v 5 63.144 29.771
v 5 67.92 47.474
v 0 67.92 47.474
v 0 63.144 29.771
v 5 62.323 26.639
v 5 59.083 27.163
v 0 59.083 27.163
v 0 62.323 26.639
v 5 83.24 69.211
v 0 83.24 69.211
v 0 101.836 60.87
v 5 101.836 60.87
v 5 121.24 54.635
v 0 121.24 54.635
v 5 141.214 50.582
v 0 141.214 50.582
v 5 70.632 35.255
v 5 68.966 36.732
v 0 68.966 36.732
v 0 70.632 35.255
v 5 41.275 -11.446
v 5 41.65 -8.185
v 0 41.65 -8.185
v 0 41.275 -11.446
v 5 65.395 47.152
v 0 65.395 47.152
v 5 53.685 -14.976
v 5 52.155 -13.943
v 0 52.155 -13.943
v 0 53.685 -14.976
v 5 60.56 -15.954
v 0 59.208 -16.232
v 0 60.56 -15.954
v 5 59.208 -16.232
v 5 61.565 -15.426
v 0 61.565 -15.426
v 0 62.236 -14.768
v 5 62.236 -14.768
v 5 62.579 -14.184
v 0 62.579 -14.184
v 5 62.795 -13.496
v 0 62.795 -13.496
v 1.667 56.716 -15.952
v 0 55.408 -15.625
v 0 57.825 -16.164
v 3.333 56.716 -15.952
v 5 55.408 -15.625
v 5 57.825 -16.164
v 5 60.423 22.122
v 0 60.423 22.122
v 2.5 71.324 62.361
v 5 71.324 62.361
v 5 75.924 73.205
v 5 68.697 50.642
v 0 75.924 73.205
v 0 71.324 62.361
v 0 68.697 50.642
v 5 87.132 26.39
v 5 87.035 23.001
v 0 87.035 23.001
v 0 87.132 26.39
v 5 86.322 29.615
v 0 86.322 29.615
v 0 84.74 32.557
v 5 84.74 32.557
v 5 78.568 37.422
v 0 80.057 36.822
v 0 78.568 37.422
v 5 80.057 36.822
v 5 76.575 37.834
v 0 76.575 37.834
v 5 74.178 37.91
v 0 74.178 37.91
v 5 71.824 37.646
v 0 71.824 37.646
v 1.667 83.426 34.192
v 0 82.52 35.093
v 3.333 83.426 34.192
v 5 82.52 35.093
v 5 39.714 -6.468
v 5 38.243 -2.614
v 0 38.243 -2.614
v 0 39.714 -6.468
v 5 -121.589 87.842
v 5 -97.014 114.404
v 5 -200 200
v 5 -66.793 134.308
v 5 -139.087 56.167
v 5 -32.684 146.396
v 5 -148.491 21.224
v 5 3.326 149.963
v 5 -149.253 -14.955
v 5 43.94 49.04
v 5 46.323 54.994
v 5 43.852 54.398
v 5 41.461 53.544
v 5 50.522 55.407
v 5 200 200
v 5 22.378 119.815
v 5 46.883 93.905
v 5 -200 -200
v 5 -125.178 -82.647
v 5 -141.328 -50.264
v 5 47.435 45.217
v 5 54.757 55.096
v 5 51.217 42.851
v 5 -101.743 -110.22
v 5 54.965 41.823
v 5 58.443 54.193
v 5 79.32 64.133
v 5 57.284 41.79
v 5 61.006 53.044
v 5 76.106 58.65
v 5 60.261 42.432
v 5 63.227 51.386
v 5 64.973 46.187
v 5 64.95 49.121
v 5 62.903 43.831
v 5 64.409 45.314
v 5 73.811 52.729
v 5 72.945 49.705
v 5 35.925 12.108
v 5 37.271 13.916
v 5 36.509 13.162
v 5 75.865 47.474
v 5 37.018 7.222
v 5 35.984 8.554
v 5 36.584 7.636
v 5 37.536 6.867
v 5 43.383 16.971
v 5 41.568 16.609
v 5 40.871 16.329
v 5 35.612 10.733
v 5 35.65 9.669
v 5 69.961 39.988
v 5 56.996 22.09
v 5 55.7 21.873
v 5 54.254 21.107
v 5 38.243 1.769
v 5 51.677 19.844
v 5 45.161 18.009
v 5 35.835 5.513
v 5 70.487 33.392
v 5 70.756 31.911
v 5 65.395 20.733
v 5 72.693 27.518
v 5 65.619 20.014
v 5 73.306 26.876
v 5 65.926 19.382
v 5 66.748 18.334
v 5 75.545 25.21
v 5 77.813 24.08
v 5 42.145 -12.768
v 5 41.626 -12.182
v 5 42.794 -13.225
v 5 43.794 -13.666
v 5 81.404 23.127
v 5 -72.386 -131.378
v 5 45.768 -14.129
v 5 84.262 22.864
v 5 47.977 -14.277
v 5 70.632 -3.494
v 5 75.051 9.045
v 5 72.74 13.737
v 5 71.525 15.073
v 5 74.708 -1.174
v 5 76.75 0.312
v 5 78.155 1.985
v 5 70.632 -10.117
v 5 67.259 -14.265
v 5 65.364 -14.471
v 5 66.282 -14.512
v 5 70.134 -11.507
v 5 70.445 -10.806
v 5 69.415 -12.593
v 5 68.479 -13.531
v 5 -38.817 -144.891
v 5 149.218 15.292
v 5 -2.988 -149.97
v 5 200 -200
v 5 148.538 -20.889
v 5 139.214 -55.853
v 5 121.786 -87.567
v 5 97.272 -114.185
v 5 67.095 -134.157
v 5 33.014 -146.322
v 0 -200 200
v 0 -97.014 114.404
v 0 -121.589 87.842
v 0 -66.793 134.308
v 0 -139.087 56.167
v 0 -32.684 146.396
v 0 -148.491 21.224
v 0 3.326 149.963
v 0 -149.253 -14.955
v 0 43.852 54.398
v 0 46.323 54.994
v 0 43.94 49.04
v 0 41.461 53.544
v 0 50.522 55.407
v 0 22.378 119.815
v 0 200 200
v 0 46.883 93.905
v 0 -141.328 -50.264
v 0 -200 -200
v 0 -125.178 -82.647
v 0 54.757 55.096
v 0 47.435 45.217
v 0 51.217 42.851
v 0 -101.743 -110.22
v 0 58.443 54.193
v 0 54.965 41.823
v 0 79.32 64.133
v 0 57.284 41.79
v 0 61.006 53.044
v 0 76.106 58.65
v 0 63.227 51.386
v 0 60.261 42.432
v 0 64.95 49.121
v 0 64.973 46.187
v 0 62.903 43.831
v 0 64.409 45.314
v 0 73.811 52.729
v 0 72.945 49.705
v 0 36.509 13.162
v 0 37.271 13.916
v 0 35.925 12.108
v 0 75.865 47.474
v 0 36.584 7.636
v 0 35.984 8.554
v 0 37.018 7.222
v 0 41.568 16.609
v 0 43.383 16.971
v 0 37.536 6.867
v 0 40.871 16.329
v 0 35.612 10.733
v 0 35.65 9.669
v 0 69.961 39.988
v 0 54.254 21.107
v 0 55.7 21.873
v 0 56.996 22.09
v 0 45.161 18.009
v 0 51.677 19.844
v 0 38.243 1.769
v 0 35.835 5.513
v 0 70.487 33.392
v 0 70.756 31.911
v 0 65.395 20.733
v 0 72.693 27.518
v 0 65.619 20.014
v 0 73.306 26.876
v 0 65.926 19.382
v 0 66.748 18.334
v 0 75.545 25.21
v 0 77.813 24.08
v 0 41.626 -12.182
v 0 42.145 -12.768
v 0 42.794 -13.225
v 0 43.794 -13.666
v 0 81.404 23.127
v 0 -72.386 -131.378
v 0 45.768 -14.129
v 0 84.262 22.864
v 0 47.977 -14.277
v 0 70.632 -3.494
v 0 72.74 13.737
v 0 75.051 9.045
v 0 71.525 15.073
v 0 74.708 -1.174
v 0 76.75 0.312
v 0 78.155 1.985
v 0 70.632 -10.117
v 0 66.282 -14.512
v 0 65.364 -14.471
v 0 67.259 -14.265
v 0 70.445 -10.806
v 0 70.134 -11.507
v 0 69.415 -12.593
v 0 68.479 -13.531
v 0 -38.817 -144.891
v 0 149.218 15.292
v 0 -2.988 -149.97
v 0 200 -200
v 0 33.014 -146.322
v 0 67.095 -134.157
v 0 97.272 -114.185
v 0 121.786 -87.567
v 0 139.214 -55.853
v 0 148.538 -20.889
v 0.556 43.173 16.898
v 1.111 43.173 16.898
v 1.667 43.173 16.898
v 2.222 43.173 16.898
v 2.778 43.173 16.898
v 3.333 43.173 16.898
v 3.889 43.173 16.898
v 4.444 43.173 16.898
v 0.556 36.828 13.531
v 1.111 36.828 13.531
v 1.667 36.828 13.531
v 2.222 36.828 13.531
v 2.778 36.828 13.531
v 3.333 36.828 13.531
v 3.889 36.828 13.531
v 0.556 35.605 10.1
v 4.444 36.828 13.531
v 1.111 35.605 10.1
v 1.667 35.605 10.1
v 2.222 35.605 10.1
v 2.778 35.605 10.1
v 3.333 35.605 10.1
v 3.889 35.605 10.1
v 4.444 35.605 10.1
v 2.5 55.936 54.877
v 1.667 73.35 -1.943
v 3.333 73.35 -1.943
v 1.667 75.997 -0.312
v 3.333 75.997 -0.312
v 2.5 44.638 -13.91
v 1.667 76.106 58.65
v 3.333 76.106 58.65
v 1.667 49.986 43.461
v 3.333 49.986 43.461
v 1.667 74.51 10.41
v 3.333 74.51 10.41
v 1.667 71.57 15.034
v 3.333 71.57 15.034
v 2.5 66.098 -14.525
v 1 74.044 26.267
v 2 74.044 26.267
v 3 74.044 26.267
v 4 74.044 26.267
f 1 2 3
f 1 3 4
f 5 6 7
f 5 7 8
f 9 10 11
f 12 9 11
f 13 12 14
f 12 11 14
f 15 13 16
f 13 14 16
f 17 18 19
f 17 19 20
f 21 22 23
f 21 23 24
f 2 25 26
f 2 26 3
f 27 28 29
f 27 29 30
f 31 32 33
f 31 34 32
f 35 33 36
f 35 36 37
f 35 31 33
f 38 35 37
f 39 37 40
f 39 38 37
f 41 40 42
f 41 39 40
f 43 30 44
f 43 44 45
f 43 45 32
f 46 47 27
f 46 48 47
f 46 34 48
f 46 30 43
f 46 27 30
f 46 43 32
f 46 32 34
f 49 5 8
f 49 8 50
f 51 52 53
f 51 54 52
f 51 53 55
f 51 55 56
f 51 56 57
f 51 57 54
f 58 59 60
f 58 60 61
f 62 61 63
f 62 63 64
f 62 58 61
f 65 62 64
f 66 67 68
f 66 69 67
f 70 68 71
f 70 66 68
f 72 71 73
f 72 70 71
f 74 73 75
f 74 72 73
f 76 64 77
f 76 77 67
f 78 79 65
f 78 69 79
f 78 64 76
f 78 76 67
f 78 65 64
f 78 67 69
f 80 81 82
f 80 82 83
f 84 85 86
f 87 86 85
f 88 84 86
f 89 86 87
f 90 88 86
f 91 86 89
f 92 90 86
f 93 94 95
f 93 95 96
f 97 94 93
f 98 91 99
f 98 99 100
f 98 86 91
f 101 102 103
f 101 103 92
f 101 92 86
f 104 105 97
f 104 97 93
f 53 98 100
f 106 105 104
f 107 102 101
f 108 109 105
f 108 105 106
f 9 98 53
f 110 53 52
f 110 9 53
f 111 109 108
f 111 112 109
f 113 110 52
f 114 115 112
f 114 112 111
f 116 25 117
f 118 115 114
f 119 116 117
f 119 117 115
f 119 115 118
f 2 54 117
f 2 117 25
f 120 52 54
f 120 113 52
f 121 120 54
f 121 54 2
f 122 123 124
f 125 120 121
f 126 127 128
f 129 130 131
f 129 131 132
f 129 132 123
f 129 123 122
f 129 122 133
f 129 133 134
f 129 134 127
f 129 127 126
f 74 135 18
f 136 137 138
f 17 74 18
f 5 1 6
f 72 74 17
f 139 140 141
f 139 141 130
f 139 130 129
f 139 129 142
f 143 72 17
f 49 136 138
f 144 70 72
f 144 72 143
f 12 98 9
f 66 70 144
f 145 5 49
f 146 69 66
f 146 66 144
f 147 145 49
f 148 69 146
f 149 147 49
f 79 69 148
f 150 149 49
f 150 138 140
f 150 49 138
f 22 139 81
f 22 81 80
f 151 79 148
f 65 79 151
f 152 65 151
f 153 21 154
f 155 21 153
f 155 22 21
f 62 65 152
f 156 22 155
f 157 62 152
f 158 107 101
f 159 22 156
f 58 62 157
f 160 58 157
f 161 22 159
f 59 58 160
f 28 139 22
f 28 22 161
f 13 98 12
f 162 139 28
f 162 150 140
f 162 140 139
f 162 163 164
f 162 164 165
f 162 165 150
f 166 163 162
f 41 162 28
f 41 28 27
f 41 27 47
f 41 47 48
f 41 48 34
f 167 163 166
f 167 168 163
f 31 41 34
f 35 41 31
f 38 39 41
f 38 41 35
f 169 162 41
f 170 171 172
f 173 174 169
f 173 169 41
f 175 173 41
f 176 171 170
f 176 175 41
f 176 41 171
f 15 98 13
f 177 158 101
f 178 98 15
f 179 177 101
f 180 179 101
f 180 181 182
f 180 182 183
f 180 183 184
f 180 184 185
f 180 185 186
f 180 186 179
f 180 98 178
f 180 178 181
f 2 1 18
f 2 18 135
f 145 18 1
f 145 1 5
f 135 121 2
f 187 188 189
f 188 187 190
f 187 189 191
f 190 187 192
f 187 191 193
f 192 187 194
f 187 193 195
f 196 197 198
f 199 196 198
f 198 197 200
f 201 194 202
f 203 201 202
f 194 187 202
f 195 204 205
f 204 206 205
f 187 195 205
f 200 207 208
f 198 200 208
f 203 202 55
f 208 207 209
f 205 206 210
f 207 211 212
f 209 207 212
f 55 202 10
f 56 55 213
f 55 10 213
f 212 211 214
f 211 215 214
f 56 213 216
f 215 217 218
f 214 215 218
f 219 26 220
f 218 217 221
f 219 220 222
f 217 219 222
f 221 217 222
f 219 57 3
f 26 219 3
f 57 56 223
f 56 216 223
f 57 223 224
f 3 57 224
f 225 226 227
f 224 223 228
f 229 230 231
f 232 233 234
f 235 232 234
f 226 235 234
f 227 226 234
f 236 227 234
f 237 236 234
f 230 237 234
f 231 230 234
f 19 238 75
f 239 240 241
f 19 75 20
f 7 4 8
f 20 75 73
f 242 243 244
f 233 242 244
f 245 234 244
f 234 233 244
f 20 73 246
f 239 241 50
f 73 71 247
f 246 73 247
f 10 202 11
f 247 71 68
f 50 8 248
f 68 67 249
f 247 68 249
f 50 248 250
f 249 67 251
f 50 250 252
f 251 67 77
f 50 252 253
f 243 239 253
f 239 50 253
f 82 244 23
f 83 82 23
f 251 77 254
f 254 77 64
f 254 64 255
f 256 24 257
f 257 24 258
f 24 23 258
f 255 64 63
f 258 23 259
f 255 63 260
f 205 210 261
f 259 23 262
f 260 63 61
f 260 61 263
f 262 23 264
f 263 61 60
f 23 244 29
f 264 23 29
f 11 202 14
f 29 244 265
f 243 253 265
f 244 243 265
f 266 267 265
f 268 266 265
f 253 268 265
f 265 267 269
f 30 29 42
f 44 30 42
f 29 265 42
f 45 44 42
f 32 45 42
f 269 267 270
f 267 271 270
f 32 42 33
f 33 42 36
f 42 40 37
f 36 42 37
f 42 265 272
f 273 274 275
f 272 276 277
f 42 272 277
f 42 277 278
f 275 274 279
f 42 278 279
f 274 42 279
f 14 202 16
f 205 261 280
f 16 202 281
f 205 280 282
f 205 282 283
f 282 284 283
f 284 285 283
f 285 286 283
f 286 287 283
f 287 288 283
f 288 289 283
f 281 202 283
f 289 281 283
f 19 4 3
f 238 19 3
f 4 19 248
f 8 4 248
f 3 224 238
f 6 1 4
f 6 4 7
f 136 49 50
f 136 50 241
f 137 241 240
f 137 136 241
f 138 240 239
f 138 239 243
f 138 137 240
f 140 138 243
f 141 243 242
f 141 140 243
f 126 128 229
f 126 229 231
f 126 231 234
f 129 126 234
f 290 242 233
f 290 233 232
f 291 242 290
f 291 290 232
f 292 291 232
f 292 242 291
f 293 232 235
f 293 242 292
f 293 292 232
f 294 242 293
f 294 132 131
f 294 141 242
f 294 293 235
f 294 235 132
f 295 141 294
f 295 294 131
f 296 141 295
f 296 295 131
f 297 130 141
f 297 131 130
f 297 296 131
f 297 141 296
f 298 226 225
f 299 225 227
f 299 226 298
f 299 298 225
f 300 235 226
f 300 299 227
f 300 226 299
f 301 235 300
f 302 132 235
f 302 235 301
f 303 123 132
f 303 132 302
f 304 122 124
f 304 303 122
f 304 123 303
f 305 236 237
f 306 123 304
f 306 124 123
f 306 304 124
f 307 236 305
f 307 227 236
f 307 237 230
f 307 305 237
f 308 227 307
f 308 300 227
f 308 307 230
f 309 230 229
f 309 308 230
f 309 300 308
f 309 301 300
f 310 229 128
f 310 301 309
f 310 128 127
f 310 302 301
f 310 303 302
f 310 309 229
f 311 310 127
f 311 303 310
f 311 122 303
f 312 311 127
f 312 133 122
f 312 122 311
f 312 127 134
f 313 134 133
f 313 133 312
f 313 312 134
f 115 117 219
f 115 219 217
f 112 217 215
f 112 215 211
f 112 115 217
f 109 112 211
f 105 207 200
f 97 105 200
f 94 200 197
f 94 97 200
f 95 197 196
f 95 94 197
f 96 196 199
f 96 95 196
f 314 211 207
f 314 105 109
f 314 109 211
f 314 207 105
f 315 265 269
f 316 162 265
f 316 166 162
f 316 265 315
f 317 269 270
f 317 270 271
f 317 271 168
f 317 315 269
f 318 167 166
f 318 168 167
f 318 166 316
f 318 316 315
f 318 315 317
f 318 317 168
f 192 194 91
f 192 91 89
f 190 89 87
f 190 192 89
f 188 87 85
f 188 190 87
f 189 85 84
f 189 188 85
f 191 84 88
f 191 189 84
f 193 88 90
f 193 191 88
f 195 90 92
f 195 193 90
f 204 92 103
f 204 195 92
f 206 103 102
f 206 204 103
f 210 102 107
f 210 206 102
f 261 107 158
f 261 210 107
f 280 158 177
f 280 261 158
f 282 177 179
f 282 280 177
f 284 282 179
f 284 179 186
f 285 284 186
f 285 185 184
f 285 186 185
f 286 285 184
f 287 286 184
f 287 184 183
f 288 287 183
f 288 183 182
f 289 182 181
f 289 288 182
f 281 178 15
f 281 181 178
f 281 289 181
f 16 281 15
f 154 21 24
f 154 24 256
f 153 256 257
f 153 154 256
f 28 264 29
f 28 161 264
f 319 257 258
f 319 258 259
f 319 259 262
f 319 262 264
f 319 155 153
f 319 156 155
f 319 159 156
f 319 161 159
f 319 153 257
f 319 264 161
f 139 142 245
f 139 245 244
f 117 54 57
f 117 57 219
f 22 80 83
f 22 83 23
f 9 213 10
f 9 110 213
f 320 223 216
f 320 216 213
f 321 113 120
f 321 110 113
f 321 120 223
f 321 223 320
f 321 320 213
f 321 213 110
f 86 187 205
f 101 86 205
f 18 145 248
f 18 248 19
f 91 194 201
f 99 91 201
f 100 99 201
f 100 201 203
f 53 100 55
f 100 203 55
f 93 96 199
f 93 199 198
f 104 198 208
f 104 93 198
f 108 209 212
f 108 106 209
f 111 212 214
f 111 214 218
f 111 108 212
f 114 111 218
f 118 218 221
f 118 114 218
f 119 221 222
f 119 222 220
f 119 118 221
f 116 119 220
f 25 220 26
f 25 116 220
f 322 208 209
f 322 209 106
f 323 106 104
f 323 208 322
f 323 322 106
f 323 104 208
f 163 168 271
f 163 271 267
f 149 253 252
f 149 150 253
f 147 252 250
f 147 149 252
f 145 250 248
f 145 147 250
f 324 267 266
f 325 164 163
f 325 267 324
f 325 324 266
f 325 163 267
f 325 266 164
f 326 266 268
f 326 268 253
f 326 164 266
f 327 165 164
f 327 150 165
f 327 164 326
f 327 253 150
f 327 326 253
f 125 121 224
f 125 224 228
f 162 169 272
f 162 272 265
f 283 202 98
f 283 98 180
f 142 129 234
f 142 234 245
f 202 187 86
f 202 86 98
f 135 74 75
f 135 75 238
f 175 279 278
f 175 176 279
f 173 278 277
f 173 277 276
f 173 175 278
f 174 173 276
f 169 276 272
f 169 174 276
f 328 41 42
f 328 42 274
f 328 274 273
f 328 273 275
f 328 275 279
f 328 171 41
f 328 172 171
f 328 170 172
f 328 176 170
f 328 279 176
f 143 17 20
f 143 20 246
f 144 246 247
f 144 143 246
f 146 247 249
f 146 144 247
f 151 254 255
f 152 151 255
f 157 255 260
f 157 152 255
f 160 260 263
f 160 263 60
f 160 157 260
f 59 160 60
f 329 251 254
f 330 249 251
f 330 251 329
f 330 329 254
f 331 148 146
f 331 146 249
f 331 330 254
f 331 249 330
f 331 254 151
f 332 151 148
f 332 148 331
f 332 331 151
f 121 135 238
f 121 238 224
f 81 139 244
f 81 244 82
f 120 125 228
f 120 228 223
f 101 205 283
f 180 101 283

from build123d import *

# Parameters (mm, degrees)
ESQUISSE1_W        = 400
ESQUISSE1_H        = 400
ESQUISSE1_R        = 150
BOSS_EXTRU_1_DEPTH = 5
BOSS_EXTRU_2_START = -5
BOSS_EXTRU_2_DEPTH = 5
BOSS_EXTRU_3_DEPTH = 5


with BuildPart() as part:
    # Esquisse1 → Boss.-Extru.1 (new body)
    with BuildSketch(Plane(origin=(0, 0, 0), x_dir=(0, 0, -1), z_dir=(1, 0, 0))):
        Rectangle(ESQUISSE1_W, ESQUISSE1_H)
        Circle(ESQUISSE1_R, mode=Mode.SUBTRACT)
    extrude(amount=BOSS_EXTRU_1_DEPTH)

    # Esquisse2 → Boss.-Extru.2 (add)
    with BuildSketch(Plane(origin=(5, 0, 0), x_dir=(0, 0, -1), z_dir=(1, 0, 0)).offset(BOSS_EXTRU_2_START)):
        with BuildLine():
            ThreePointArc((-149.963113542, 3.326345848), (-83.411685222, 60.117854594), (-50.582353171, 141.214112424))
            ThreePointArc((-50.582353171, 141.214112424), (-121.687633298, 87.704731357), (-149.963113542, 3.326345848))
        make_face()
    extrude(amount=BOSS_EXTRU_2_DEPTH)

    # Esquisse3 → Boss.-Extru.3 (add)
    with BuildSketch(Plane(origin=(5, 0, 0), x_dir=(0, 0, -1), z_dir=(1, 0, 0))):
        with BuildLine():
            Line((-50.641756069, 68.696951836), (-49.121294777, 64.950100794))
            add(Edge.make_bspline(
                [(-49.121294777, 64.950100794), (-52.51075488, 63.09305926), (-56.251037239, 54.874213626), (-55.436032913, 45.973549374), (-53.544421741, 41.460575016)],
                knots=[0, 0, 0, 0, 0.427817388, 1, 1, 1, 1], degree=3))
            add(Edge.make_bspline(
                [(-53.544421741, 41.460575016), (-49.493771524, 43.143934267), (-43.677837846, 47.551694172), (-40.650983319, 57.726456605), (-43.687514554, 64.208576547), (-47.151888648, 65.394746752)],
                knots=[0, 0, 0, 0, 0.433456204, 0.652391978, 1, 1, 1, 1], degree=3))
            Line((-47.151888648, 65.394746752), (-47.473938049, 67.920044269))
            Line((-47.473938049, 67.920044269), (-29.771089937, 63.143994688))
            Line((-29.771089937, 63.143994688), (-27.162840794, 59.083409632))
            Line((-27.162840794, 59.083409632), (-26.639406106, 62.322569421))
            Line((-26.639406106, 62.322569421), (-22.121567137, 60.423023491))
            add(Edge.make_bspline(
                [(-22.121567137, 60.423023491), (-21.900652986, 58.844405298), (-22.593906313, 56.188877616), (-20.433988328, 53.424341294), (-19.157824546, 49.900753611), (-18.893704947, 46.014732552), (-16.715964955, 43.373118799), (-16.761241643, 40.99576311), (-14.932536534, 39.250943841), (-13.221453122, 35.220671727), (-8.354015779, 34.949952489), (-6.866737858, 37.536191267)],
                knots=[0, 0, 0, 0, 0.150869305, 0.214819056, 0.309773428, 0.491679736, 0.556111964, 0.609109072, 0.695847406, 0.772434776, 1, 1, 1, 1], degree=3))
            Line((-6.866737858, 37.536191267), (-5.513363019, 35.834805755))
            Line((-5.513363019, 35.834805755), (-1.768809898, 38.243418268))
            Line((-1.768809898, 38.243418268), (2.613795129, 38.243418268))
            Line((2.613795129, 38.243418268), (6.468274065, 39.713813265))
            Line((6.468274065, 39.713813265), (8.184977276, 41.64986563))
            Line((8.184977276, 41.64986563), (11.445710099, 41.275068754))
            add(Edge.make_bspline(
                [(11.445710099, 41.275068754), (12.91703059, 41.729549687), (14.682145059, 45.752837691), (14.248125034, 49.630437287), (13.942831767, 52.154597518)],
                knots=[0, 0, 0, 0, 0.363892157, 1, 1, 1, 1], degree=3))
            add(Edge.make_bspline(
                [(13.942831767, 52.154597518), (15.106729387, 53.423805744), (15.81295353, 55.843879283), (16.578340557, 59.892537097), (15.323868262, 62.437984958), (13.495569111, 62.795247815)],
                knots=[0, 0, 0, 0, 0.408732991, 0.60243167, 1, 1, 1, 1], degree=3))
            add(Edge.make_bspline(
                [(13.495569111, 62.795247815), (13.970078, 63.802995831), (15.705345795, 67.184562867), (12.041497459, 70.287418684), (10.116975826, 70.632248522)],
                knots=[0, 0, 0, 0, 0.344176041, 1, 1, 1, 1], degree=3))
            Line((10.116975826, 70.632248522), (3.494410121, 70.632248522))
            add(Edge.make_bspline(
                [(3.494410121, 70.632248522), (1.786435249, 73.243810631), (0.841555231, 76.383068781), (-1.984622914, 78.154912931)],
                knots=[0, 0, 0, 0, 1, 1, 1, 1], degree=3))
            add(Edge.make_bspline(
                [(-1.984622914, 78.154912931), (-4.619654468, 76.485525149), (-9.255881643, 75.250433561), (-16.519433272, 71.568054765), (-17.480141985, 66.153041817), (-20.733248382, 65.394746752)],
                knots=[0, 0, 0, 0, 0.395717089, 0.631602506, 1, 1, 1, 1], degree=3))
            Line((-20.733248382, 65.394746752), (-36.731609625, 68.966498574))
            Line((-36.731609625, 68.966498574), (-35.254584345, 70.632248522))
            add(Edge.make_bspline(
                [(-35.254584345, 70.632248522), (-33.26309679, 70.210780339), (-28.028974684, 72.174025739), (-27.339523708, 72.730784764), (-25.299138881, 75.206231145), (-23.154125649, 79.109230145), (-22.637221031, 84.197953328), (-23.001491077, 87.035020266)],
                knots=[0, 0, 0, 0, 0.05163777, 0.199516391, 0.247017501, 0.508164038, 1, 1, 1, 1], degree=3))
            add(Edge.make_bspline(
                [(-23.001491077, 87.035020266), (-27.142409249, 87.753037067), (-32.808173774, 85.571818964), (-38.094245187, 78.91770696), (-38.086684666, 74.341614121), (-37.646065549, 71.823781121)],
                knots=[0, 0, 0, 0, 0.488970635, 0.684624182, 1, 1, 1, 1], degree=3))
            Line((-37.646065549, 71.823781121), (-39.987885316, 69.960969942))
            Line((-39.987885316, 69.960969942), (-49.705455686, 72.944960143))
            Line((-49.705455686, 72.944960143), (-47.473938049, 75.865174629))
            Line((-47.473938049, 75.865174629), (-52.728820416, 73.810875285))
            add(Edge.make_bspline(
                [(-52.728820416, 73.810875285), (-65.290226854, 77.416651114), (-74.909544365, 88.095525002), (-82.830465292, 97.70673649)],
                knots=[0, 0, 0, 0, 1, 1, 1, 1], degree=3))
            Line((-82.830465292, 97.70673649), (-88.369376858, 87.035020266))
            add(Edge.make_bspline(
                [(-88.369376858, 87.035020266), (-72.280582145, 71.618587652), (-50.641756069, 68.696951836)],
                knots=[0, 0, 0, 1, 1, 1], degree=2))
        make_face()
    extrude(amount=-BOSS_EXTRU_3_DEPTH)


solid = part.part
